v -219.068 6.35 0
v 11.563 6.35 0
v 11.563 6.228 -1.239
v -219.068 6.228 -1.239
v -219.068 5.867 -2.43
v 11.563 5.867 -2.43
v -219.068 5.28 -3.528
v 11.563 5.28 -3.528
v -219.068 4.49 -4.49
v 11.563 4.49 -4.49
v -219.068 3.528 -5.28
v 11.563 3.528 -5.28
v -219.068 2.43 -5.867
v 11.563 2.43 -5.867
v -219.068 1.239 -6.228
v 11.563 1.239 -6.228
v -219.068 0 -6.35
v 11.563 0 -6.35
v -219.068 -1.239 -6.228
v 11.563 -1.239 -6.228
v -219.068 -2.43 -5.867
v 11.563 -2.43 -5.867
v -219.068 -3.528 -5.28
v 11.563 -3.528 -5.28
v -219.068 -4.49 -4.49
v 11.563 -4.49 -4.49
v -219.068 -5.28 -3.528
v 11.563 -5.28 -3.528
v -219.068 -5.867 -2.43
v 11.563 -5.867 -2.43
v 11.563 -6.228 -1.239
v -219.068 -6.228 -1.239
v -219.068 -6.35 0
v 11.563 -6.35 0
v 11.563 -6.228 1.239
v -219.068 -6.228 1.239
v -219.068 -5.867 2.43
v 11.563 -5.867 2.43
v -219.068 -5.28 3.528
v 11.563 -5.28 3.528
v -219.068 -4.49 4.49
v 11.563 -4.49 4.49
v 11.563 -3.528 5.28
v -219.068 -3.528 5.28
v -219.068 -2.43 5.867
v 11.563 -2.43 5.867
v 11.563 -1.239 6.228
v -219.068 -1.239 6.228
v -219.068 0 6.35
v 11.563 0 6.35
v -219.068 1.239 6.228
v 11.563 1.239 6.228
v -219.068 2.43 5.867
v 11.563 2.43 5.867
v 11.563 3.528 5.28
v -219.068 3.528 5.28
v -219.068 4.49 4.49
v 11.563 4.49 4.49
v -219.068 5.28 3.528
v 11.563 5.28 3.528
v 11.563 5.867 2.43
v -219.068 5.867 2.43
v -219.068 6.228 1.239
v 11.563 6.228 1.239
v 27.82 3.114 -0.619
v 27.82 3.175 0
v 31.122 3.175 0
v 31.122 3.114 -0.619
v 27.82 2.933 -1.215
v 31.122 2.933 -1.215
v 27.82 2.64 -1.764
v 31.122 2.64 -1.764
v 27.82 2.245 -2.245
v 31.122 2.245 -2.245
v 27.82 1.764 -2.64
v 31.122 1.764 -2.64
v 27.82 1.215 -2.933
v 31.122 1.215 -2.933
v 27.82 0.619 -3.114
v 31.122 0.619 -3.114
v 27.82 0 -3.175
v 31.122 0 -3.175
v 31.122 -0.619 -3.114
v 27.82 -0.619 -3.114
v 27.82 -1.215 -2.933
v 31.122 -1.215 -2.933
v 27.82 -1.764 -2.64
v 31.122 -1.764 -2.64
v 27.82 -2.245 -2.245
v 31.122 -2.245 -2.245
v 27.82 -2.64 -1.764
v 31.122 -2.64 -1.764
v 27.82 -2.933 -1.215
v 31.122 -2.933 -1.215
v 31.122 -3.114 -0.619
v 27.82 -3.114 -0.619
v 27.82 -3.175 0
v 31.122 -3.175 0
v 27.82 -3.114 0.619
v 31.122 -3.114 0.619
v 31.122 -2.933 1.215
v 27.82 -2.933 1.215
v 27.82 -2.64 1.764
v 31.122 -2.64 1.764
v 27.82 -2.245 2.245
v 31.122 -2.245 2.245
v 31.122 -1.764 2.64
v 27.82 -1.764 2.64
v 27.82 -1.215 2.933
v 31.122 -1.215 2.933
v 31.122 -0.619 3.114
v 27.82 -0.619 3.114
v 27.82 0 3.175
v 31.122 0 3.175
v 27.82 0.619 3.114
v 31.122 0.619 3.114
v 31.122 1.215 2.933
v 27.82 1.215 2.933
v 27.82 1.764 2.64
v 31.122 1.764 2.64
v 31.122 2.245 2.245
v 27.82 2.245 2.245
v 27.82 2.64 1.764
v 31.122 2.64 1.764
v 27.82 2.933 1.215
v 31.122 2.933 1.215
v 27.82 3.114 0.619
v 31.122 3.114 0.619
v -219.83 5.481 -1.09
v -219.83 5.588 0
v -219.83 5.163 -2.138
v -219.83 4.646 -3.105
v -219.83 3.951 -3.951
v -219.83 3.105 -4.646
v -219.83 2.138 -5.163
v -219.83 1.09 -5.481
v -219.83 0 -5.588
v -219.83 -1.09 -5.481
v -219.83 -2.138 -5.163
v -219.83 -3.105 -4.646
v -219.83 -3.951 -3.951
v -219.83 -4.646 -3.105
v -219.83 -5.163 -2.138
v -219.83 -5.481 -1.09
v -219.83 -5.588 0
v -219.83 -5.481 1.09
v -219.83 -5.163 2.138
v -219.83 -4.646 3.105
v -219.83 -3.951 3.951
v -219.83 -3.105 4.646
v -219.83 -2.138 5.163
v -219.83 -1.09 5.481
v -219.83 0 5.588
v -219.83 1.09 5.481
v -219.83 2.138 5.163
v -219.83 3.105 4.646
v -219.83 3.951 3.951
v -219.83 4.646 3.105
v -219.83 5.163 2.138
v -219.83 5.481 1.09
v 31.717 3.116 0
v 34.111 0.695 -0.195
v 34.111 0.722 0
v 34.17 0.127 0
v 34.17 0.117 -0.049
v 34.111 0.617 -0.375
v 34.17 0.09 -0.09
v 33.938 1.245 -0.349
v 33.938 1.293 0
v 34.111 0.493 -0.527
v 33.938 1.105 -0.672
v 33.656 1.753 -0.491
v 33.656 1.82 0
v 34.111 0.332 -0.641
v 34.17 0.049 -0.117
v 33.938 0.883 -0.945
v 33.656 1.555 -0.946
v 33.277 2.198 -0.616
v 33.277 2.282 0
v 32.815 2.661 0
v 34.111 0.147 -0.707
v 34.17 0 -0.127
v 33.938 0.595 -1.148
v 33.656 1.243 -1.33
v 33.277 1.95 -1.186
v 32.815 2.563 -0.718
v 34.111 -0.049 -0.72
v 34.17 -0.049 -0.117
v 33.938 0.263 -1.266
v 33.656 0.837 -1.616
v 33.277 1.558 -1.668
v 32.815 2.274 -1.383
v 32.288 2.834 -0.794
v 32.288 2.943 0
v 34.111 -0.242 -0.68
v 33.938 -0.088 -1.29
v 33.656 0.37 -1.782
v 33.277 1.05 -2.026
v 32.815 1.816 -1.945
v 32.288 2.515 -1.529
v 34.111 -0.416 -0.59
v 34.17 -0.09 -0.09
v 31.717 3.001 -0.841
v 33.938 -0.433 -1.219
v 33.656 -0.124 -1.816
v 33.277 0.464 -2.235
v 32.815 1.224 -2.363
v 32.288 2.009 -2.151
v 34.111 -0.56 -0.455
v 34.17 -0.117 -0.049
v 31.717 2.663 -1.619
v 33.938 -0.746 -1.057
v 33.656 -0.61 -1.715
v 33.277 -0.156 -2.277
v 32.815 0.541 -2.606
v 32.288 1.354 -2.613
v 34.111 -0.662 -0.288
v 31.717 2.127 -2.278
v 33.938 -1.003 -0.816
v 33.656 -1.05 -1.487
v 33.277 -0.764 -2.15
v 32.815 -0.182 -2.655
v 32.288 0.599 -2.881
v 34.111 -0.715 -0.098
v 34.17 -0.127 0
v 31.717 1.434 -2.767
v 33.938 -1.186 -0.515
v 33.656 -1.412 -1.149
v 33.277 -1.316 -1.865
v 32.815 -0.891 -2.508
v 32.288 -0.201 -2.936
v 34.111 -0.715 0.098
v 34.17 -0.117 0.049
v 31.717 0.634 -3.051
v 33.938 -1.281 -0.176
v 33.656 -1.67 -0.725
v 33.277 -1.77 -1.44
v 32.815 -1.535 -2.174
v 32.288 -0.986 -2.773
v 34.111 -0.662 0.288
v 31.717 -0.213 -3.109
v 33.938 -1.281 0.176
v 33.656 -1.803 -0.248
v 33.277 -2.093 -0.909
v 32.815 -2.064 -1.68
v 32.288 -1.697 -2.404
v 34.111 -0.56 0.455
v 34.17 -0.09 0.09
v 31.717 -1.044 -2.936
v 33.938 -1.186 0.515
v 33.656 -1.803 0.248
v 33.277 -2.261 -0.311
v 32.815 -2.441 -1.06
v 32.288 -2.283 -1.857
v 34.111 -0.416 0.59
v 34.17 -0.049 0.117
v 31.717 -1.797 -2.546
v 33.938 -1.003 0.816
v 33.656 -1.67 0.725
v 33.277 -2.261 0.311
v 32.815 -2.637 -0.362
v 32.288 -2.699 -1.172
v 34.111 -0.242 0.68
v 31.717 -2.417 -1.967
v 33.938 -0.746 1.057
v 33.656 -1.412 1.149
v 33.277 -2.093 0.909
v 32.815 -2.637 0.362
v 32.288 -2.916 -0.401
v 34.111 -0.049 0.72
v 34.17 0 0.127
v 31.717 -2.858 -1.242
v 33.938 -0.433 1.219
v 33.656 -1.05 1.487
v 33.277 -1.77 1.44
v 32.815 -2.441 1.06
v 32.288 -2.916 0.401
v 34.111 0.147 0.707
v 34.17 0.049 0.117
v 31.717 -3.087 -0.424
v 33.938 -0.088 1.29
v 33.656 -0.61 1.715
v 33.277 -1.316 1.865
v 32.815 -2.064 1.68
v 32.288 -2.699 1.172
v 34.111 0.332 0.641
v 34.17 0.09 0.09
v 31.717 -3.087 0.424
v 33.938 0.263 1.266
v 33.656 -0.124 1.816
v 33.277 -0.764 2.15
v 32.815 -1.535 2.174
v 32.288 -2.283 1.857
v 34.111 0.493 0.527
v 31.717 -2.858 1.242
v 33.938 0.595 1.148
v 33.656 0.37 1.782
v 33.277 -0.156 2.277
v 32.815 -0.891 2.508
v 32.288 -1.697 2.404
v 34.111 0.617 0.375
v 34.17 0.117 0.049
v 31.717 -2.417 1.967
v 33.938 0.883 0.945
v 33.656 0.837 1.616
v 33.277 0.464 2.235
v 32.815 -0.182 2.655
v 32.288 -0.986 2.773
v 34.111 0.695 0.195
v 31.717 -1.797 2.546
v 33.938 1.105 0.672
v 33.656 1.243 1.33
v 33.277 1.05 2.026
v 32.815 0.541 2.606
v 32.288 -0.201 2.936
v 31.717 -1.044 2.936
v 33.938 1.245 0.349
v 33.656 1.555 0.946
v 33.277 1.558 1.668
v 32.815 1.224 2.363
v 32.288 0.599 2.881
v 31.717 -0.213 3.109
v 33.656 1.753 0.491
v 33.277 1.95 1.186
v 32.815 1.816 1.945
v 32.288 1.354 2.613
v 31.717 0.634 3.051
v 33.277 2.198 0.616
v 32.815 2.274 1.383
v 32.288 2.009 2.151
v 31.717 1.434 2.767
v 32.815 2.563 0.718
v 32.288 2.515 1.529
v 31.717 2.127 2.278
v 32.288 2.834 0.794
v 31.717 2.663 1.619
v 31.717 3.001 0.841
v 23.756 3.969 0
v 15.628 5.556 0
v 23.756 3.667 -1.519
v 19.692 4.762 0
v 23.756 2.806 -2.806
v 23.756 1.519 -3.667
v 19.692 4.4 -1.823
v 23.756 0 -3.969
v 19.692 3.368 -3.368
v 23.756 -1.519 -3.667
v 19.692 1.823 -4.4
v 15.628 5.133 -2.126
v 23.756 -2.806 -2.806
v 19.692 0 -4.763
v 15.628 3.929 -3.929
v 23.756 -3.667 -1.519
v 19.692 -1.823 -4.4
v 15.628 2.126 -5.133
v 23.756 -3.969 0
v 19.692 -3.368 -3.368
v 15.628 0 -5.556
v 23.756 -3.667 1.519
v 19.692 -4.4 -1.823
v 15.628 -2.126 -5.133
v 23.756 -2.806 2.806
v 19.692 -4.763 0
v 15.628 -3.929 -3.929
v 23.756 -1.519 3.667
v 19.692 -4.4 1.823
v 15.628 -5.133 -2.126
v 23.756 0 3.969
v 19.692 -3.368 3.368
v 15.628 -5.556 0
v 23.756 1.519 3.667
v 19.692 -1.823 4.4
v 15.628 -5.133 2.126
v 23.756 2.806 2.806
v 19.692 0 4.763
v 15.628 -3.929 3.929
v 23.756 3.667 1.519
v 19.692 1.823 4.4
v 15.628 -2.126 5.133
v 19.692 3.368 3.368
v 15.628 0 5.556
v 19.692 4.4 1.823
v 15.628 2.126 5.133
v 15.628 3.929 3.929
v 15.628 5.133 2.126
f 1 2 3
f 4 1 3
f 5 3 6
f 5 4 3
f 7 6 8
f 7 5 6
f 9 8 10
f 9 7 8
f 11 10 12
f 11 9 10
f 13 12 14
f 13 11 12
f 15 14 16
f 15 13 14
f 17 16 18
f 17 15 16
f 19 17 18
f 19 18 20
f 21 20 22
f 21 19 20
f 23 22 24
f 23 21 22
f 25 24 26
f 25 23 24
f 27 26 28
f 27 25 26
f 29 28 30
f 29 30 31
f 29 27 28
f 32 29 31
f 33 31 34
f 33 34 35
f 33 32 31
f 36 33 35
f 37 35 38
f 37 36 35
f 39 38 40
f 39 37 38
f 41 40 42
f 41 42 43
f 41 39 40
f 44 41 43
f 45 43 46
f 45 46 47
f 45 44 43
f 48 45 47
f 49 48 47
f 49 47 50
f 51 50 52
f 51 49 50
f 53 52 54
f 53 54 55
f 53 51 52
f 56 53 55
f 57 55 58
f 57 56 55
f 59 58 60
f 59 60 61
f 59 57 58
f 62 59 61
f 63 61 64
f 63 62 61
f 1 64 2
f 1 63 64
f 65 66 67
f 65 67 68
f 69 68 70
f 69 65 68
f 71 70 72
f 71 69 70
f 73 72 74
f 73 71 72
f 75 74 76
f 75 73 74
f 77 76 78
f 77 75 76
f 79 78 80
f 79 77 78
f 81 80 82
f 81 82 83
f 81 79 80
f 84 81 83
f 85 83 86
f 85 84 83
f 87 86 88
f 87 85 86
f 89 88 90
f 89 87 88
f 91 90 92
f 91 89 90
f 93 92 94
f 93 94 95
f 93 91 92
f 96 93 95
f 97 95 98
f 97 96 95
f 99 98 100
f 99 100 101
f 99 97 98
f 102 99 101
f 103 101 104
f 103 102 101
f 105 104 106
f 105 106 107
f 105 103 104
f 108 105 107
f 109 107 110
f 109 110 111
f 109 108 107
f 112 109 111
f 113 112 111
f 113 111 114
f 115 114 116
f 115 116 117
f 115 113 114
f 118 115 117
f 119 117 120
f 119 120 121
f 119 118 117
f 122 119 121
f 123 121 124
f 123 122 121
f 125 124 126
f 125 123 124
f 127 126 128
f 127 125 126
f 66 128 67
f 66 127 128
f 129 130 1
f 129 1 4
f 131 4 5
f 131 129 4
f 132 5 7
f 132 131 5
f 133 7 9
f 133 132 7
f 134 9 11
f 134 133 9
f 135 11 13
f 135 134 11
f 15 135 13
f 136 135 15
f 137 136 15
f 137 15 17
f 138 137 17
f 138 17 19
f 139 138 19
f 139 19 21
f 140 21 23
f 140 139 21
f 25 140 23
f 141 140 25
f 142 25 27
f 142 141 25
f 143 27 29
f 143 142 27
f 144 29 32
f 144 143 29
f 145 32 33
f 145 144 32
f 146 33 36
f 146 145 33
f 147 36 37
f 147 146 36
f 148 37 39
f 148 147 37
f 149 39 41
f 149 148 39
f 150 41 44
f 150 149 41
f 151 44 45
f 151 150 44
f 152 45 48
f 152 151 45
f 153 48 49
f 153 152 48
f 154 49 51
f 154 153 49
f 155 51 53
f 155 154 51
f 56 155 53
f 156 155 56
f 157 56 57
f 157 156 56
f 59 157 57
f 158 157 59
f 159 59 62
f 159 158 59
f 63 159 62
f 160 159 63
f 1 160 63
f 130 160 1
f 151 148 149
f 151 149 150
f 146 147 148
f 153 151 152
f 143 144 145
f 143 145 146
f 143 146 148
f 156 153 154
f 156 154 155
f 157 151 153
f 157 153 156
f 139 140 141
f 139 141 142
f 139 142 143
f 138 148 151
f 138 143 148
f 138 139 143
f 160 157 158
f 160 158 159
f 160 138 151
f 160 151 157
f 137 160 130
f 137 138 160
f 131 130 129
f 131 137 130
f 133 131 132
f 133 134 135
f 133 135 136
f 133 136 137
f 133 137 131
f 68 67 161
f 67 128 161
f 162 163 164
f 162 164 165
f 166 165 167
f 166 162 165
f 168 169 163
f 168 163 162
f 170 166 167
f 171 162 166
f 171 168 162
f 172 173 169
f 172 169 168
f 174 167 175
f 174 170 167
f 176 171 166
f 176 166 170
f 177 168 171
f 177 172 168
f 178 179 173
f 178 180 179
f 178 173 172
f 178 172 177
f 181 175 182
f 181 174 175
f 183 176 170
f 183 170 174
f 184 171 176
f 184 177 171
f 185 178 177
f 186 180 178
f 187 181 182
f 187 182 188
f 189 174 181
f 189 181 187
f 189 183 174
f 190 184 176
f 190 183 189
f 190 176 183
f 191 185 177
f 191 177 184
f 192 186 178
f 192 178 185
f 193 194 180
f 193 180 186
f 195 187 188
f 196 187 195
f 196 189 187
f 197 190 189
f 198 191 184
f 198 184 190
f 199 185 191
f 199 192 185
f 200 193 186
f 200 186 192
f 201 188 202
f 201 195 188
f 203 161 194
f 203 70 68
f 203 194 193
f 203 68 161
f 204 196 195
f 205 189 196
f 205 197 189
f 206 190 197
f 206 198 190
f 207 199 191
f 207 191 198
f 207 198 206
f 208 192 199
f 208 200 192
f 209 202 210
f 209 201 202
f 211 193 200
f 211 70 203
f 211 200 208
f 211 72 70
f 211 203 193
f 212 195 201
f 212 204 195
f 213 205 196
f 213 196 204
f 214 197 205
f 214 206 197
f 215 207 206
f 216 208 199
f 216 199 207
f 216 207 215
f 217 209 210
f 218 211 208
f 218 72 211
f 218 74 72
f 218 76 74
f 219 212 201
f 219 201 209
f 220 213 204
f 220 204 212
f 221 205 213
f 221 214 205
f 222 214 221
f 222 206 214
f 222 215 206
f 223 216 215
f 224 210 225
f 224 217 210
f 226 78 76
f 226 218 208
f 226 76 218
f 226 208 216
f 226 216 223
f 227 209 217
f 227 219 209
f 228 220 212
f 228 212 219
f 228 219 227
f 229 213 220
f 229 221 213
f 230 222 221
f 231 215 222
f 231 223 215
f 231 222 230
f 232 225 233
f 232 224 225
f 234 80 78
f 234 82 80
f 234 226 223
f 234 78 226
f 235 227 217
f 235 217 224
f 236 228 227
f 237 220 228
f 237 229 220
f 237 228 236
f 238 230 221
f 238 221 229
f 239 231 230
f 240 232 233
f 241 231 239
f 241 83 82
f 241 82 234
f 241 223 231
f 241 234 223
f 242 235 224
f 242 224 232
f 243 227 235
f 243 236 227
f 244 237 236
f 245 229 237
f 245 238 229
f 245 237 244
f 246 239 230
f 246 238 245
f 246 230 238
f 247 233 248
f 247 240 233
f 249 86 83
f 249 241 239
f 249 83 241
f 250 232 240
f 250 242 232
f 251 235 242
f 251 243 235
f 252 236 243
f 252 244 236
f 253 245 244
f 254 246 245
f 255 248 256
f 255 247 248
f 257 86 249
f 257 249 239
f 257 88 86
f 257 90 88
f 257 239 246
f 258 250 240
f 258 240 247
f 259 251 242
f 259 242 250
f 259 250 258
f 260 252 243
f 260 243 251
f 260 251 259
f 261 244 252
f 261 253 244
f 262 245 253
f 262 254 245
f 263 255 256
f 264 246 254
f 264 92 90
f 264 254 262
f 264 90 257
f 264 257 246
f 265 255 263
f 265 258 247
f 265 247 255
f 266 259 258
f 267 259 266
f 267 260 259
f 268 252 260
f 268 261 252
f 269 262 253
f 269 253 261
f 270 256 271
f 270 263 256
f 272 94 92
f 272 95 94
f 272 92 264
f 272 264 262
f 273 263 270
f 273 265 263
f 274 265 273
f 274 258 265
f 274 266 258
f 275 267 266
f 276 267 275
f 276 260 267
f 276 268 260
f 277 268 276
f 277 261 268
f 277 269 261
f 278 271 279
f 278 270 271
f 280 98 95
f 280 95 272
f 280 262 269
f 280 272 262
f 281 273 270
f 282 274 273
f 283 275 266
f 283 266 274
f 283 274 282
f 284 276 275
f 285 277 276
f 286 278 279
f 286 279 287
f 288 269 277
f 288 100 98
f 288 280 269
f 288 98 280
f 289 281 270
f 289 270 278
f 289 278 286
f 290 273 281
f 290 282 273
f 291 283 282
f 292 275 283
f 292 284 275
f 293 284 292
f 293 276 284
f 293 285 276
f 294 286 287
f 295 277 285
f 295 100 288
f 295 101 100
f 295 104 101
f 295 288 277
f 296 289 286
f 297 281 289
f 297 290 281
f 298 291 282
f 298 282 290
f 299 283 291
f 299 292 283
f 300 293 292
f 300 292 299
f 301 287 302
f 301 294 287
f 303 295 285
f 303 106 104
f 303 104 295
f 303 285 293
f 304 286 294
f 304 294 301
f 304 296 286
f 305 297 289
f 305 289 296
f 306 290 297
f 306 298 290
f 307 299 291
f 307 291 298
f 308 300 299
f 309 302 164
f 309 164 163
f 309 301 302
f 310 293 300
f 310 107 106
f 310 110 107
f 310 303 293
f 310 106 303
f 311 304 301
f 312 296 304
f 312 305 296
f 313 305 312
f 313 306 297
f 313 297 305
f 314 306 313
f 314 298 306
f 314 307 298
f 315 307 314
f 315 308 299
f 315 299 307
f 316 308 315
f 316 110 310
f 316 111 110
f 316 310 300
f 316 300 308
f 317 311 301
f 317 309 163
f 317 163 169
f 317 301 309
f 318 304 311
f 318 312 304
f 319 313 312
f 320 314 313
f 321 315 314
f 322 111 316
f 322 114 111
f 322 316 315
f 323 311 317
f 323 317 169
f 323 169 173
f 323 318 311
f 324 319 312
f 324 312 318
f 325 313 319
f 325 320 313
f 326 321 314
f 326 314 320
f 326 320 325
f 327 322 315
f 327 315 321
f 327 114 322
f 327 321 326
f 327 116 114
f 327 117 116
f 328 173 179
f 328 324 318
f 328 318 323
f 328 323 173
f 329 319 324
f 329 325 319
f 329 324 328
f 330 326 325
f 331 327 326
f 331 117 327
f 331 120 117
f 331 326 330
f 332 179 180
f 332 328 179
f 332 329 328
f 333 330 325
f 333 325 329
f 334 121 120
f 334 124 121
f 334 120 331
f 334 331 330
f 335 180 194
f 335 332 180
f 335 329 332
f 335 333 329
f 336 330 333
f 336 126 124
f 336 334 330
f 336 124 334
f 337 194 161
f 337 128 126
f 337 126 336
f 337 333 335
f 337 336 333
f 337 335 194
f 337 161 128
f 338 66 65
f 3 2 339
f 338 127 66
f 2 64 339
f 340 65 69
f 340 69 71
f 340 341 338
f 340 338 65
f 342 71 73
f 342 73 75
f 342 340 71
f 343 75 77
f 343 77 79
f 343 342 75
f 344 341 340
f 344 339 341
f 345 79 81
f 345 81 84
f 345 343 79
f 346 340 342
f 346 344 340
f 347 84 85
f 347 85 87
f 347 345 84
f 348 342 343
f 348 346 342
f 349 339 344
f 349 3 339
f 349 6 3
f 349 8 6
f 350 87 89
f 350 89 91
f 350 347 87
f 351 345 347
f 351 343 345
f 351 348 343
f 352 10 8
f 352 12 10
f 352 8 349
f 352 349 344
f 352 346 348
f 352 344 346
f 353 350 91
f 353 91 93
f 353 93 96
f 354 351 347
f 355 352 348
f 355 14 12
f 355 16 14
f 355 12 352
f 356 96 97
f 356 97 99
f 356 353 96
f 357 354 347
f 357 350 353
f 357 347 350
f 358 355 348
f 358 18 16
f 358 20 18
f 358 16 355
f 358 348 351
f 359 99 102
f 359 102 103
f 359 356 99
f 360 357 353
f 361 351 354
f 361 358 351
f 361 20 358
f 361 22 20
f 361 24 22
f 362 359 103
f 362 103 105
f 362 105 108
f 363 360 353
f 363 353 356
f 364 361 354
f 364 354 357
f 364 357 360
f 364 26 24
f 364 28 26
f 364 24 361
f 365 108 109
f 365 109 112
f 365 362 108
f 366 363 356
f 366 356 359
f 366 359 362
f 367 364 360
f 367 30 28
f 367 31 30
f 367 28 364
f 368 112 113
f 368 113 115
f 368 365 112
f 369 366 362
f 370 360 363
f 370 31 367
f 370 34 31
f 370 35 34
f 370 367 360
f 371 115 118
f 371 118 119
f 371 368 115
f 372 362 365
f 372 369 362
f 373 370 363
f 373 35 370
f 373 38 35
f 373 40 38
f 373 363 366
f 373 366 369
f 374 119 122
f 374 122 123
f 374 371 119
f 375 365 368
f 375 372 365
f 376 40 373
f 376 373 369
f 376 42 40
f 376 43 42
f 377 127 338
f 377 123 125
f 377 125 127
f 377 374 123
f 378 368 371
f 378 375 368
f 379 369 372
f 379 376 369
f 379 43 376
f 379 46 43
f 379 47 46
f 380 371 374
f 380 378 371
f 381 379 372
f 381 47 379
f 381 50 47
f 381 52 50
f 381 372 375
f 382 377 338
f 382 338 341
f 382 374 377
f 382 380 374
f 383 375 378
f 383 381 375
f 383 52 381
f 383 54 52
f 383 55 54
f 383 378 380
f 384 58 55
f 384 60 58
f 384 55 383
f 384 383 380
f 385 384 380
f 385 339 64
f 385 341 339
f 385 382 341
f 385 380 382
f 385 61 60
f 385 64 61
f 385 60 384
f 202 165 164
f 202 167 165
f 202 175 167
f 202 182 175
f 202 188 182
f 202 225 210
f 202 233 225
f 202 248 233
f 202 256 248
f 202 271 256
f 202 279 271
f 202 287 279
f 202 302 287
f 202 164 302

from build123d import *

# Parameters (mm, degrees)
F2_R    = 3.048
F3_SIZE = 0.762


with BuildPart() as f1:
    # F0 (on Top) → F1 (revolve)
    with BuildSketch(Plane.XY):
        Polygon((-219.829988, 6.35), (-219.829988, 0), (34.170012, 0), (34.170012, 3.175), (27.820012, 3.175), (11.563331, 6.35), align=None)
    revolve(axis=Axis((-92.829988, 0, 0), (-1, 0, 0)))

    # F2
    f2_edges = [f1.edges().sort_by_distance(p)[0] for p in [
        (34.170012, -3.175, 0),
    ]]
    fillet(f2_edges, radius=F2_R)

    # F3
    f3_edges = [f1.edges().sort_by_distance(p)[0] for p in [
        (-219.829988, -6.35, 0),
    ]]
    chamfer(f3_edges, length=F3_SIZE)


solid = f1.part
